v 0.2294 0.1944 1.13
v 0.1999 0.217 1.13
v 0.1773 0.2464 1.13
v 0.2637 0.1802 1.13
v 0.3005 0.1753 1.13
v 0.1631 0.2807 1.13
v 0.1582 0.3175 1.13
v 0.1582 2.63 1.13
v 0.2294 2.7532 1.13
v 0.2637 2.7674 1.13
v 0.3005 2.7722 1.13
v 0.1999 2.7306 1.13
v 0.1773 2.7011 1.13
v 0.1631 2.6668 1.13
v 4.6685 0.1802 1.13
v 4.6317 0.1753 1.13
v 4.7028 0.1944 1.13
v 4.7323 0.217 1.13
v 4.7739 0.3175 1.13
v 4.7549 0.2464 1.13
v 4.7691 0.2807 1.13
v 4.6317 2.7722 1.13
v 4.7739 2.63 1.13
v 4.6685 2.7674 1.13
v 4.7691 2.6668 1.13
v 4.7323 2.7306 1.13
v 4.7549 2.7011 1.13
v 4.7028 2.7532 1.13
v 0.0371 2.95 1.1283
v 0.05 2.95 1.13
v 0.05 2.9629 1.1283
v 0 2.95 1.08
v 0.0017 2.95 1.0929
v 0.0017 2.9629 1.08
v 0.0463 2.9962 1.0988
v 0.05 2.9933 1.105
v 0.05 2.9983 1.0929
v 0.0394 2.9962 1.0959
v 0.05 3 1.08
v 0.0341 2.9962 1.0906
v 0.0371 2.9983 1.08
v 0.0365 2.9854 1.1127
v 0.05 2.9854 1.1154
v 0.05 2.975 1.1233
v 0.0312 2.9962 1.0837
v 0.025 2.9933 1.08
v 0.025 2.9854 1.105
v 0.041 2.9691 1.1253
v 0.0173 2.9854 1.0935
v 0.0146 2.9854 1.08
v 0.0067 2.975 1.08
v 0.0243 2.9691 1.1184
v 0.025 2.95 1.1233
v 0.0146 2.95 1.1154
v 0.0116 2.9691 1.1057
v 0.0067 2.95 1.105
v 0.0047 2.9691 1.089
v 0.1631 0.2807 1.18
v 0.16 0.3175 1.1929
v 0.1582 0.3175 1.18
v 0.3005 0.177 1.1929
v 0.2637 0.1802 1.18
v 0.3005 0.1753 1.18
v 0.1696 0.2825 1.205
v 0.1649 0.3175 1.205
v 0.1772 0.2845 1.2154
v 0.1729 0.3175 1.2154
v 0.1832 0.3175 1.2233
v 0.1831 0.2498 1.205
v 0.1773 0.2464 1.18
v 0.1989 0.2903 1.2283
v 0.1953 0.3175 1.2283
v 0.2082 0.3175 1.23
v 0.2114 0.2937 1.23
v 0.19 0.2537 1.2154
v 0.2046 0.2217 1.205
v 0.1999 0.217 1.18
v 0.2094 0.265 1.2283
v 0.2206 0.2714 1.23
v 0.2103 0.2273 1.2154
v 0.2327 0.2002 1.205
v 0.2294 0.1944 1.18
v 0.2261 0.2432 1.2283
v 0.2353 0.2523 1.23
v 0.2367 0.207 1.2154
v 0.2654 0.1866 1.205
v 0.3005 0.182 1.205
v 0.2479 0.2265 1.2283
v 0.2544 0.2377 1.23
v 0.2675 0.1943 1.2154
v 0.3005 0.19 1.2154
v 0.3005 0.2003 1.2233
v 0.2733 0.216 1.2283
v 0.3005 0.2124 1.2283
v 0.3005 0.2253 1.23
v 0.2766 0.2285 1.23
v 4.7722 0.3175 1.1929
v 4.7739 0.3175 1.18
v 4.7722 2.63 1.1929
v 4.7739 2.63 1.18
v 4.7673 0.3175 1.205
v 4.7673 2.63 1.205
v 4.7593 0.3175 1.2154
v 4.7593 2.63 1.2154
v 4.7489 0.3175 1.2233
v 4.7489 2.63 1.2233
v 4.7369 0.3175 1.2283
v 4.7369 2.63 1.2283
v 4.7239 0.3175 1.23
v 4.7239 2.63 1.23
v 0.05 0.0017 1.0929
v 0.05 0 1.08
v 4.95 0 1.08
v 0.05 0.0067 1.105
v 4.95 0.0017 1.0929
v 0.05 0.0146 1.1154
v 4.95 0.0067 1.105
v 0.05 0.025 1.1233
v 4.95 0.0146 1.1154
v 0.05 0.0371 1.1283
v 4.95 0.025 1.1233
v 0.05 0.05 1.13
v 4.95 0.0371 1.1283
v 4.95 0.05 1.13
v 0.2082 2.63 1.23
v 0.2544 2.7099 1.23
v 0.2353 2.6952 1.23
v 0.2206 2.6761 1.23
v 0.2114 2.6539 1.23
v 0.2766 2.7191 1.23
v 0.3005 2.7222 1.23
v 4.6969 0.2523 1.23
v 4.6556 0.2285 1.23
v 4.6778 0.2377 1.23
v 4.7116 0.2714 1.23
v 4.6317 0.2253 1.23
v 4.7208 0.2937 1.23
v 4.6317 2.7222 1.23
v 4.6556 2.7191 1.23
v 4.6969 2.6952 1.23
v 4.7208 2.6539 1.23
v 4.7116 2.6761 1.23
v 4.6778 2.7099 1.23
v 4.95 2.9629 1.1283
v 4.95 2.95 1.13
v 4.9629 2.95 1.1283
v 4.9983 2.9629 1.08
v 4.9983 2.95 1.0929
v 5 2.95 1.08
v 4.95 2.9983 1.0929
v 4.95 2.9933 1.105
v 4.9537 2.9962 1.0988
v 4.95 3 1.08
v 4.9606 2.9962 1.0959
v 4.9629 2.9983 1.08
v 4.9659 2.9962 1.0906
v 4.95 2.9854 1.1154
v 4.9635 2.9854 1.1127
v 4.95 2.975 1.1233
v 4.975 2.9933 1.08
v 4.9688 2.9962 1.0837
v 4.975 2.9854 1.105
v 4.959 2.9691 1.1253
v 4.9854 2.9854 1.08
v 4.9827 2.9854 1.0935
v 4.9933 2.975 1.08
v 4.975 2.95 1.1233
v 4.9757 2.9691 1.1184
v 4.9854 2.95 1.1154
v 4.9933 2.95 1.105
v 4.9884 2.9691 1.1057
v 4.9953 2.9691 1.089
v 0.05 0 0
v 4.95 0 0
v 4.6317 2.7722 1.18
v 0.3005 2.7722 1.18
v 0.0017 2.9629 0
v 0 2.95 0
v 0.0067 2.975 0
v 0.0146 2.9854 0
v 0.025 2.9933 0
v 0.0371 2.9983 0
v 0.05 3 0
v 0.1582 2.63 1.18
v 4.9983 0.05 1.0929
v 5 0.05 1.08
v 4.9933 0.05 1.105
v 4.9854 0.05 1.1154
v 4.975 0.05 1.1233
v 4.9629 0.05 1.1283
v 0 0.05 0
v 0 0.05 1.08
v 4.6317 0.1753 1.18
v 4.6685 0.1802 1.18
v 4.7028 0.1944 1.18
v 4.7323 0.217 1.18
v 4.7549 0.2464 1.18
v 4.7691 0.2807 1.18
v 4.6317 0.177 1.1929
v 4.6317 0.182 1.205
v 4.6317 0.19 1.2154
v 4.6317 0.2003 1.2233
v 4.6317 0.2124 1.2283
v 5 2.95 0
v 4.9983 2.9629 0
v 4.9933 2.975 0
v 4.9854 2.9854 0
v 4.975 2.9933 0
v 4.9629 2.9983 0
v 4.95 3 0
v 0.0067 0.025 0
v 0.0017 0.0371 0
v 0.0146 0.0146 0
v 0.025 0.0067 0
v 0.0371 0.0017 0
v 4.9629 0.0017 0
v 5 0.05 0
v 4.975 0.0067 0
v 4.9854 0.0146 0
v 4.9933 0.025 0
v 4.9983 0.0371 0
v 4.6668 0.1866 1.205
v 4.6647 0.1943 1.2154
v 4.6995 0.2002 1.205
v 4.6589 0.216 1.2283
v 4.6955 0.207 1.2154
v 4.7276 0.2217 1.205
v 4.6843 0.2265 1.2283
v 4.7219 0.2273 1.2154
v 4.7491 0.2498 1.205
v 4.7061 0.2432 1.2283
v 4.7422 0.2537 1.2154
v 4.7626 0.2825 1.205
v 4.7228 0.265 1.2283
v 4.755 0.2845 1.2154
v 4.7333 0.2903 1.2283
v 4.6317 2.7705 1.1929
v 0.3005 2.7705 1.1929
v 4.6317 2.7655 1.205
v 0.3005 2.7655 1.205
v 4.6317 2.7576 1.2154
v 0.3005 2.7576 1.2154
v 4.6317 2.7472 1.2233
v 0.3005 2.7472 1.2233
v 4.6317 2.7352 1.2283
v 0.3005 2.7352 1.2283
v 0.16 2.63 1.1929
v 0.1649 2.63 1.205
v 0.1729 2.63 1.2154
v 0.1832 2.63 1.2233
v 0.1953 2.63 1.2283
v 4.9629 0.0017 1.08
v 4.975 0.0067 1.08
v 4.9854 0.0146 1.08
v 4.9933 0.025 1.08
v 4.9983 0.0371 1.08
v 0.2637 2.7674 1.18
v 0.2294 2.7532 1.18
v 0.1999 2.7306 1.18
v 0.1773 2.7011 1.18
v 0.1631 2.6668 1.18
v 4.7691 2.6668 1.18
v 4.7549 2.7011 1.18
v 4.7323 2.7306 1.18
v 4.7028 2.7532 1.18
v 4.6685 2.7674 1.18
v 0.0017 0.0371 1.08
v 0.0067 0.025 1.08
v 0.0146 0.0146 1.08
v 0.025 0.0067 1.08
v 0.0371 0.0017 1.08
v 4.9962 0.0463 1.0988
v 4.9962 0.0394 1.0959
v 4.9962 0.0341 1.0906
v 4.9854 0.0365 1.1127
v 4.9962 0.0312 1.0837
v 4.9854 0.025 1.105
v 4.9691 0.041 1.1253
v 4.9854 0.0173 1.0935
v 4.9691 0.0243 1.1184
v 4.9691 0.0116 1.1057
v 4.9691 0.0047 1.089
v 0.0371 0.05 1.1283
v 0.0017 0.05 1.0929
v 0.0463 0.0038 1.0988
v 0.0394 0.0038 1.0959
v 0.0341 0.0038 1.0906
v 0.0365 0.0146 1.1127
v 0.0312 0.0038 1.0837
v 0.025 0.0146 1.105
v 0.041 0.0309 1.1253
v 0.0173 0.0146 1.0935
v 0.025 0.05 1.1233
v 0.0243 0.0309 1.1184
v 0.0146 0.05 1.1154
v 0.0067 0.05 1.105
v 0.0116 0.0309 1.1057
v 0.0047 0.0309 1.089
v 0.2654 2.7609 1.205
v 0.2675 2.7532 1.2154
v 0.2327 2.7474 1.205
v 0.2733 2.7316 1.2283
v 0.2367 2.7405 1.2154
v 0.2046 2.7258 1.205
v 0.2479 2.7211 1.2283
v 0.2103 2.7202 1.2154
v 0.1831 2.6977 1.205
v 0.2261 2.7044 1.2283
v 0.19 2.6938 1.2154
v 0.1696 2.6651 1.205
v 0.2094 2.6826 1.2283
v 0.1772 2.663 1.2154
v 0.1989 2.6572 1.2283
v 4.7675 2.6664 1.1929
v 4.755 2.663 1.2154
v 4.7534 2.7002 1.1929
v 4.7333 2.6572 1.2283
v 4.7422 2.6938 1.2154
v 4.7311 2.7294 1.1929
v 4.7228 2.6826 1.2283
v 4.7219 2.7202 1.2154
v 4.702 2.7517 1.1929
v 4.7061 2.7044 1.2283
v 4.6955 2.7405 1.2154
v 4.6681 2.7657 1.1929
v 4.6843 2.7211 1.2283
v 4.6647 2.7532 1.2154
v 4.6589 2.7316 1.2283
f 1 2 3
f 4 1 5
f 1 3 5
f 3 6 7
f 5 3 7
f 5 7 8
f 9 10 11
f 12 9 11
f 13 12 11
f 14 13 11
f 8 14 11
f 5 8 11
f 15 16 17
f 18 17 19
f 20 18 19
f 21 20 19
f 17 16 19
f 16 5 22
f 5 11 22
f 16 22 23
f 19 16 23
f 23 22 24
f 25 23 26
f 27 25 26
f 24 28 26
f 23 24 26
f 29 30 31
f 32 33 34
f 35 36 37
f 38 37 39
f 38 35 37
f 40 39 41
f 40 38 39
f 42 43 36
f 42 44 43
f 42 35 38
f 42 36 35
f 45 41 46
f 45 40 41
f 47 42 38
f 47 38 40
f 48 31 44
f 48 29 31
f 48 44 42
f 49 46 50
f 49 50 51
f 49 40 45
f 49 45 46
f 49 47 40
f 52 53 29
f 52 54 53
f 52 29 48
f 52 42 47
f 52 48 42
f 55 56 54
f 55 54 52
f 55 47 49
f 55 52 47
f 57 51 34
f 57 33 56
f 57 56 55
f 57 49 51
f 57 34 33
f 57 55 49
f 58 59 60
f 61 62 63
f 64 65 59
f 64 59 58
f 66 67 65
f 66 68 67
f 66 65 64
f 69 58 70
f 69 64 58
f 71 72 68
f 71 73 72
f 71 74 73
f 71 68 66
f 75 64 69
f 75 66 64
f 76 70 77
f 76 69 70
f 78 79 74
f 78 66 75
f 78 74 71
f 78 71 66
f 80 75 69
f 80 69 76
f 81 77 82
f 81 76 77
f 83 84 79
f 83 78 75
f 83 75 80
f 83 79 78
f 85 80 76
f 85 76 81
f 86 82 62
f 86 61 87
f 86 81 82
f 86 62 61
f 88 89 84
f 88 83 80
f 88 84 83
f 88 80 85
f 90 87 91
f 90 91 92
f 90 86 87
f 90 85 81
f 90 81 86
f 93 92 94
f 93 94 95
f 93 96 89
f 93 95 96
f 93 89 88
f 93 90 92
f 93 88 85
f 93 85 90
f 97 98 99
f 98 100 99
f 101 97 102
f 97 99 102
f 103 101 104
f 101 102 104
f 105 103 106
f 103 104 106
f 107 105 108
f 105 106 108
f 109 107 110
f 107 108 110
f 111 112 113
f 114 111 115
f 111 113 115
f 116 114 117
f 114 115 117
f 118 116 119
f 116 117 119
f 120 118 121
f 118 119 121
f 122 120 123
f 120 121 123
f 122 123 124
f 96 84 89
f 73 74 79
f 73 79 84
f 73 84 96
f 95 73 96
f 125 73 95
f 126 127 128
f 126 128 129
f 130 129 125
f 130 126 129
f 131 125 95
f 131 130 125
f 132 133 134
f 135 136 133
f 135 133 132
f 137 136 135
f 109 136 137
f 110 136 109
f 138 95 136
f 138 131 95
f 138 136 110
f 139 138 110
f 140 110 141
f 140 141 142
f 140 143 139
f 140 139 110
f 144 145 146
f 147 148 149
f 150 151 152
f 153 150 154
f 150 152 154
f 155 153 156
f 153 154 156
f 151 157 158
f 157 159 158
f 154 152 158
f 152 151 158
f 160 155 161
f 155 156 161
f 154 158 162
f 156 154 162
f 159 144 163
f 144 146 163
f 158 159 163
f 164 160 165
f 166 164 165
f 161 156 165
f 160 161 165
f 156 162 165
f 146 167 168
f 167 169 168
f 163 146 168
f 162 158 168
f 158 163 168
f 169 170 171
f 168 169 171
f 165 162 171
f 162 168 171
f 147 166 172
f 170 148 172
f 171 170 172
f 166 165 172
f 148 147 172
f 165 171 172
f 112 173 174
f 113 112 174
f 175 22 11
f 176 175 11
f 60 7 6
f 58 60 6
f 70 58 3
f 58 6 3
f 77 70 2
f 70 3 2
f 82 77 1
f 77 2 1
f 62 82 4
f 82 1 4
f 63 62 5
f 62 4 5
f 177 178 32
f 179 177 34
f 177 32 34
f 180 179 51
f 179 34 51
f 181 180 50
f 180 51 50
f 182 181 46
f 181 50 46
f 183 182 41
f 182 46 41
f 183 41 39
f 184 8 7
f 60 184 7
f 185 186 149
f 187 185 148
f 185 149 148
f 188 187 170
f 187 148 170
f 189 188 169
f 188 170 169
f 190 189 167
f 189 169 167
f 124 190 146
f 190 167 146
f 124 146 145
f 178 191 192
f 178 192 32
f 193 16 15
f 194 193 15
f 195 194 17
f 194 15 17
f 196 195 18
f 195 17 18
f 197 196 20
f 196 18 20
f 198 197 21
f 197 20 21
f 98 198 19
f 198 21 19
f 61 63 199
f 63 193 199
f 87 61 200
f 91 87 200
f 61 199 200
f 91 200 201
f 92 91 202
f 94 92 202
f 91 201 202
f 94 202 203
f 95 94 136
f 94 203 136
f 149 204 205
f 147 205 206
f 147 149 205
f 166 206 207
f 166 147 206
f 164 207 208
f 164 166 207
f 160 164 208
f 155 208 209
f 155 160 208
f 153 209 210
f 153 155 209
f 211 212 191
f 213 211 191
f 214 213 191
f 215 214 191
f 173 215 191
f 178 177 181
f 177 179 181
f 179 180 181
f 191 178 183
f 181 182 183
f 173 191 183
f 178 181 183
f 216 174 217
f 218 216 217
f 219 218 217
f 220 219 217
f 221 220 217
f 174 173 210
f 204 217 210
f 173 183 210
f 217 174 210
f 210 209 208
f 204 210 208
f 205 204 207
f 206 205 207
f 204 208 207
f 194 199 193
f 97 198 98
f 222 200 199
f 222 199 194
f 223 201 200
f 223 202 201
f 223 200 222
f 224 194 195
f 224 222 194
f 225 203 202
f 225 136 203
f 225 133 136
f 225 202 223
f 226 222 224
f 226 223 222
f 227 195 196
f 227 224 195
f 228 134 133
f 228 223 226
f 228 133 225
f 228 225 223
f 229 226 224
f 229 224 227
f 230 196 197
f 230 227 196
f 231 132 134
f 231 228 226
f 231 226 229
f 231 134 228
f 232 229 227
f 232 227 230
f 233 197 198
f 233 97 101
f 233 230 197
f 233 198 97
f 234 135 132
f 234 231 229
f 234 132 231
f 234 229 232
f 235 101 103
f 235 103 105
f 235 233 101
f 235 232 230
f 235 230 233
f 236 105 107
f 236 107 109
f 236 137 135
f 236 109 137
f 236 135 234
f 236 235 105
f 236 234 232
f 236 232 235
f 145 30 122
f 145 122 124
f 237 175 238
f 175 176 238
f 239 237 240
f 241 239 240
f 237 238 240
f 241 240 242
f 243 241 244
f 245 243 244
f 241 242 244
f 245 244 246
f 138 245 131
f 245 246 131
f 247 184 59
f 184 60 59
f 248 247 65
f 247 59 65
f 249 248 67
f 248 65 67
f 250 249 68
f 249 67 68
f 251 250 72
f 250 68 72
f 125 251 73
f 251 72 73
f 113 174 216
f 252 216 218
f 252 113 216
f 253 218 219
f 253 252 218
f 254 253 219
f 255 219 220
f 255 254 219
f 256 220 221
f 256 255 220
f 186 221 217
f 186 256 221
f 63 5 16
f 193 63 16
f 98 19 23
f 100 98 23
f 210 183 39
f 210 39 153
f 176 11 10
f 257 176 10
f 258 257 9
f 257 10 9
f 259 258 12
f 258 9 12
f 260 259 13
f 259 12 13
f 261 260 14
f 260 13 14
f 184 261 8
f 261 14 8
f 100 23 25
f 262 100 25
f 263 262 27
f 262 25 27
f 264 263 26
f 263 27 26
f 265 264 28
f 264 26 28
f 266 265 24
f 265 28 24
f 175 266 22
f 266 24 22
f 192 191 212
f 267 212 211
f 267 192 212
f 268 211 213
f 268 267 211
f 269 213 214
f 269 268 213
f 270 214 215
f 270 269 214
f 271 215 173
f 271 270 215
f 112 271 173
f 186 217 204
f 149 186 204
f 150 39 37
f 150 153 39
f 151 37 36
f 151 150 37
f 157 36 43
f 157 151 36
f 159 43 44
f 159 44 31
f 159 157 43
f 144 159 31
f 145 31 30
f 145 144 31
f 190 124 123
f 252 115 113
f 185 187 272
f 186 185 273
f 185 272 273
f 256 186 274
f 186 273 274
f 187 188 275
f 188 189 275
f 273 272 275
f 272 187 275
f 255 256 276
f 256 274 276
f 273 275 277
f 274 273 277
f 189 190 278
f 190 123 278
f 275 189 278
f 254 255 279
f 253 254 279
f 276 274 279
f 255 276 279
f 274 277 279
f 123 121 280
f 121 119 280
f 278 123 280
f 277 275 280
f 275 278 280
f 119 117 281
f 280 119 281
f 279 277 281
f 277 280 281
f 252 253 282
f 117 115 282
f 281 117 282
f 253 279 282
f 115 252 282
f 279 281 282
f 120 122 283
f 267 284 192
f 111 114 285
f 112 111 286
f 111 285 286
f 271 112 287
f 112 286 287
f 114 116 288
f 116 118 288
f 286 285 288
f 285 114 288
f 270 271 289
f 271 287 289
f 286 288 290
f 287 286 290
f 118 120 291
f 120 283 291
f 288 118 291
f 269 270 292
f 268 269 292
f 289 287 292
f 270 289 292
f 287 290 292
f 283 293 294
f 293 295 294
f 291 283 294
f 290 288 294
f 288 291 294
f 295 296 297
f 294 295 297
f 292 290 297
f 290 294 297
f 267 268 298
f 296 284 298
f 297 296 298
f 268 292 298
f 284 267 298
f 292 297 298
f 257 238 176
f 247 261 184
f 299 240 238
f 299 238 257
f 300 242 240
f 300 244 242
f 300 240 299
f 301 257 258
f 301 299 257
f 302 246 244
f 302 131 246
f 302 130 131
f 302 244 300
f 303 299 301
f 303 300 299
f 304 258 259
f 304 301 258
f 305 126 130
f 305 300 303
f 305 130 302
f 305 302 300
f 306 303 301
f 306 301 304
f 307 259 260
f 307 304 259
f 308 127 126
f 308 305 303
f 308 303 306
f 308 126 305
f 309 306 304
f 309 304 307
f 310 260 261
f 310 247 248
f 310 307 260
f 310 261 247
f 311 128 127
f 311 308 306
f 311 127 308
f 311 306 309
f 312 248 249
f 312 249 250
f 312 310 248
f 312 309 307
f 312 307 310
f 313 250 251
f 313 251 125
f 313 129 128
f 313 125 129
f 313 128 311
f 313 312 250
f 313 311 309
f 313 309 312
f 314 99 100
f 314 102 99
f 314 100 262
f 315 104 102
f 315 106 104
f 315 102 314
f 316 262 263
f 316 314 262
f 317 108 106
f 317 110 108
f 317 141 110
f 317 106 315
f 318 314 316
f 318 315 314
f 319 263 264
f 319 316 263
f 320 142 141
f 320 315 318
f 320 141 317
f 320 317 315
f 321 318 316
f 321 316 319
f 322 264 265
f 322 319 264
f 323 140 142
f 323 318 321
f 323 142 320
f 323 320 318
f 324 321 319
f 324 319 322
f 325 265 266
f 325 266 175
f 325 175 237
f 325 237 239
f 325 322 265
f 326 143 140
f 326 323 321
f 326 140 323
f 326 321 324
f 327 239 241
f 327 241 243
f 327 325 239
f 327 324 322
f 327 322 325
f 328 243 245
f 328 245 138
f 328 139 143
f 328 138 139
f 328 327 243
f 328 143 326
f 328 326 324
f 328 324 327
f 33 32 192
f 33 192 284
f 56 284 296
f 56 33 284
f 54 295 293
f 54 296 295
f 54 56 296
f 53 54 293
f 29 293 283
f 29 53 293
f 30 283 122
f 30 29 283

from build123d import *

# Parameters (mm, degrees)
F0_W     = 5
F0_H     = 3
F1_DEPTH = 1.13
F3_DEPTH = 0.1
F4_R     = 0.05
F5_R     = 0.05


with BuildPart() as f1:
    # F0 (on Top) → F1 (new body)
    with BuildSketch(Plane.XY):
        with Locations((2.5, 1.5)):
            Rectangle(F0_W, F0_H)
    extrude(amount=F1_DEPTH)

    # F5
    f5_edges = [f1.edges().sort_by_distance(p)[0] for p in [
        (0, 1.5, 1.13),
        (2.5, 0, 1.13),
        (5, 1.5, 1.13),
        (2.5, 3, 1.13),
        (5, 3, 0.565),
        (5, 0, 0.565),
        (0, 3, 0.565),
        (0, 0, 0.565),
    ]]
    fillet(f5_edges, radius=F5_R)


with BuildPart() as f3:
    # F2 (on face) → F3 (new body)
    with BuildSketch(Plane.XY.offset(1.13)):
        with BuildLine():
            Line((4.631715, 2.772216), (0.30048, 2.772216))
            ThreePointArc((0.30048, 2.772216), (0.199906, 2.730556), (0.158247, 2.629982))
            Line((0.158247, 2.629982), (0.158247, 0.317543))
            ThreePointArc((0.158247, 0.317543), (0.199906, 0.216969), (0.30048, 0.17531))
            Line((0.30048, 0.17531), (4.631715, 0.17531))
            ThreePointArc((4.631715, 0.17531), (4.73229, 0.216969), (4.773949, 0.317543))
            Line((4.773949, 0.317543), (4.773949, 2.629982))
            ThreePointArc((4.773949, 2.629982), (4.73229, 2.730556), (4.631715, 2.772216))
        make_face()
    extrude(amount=F3_DEPTH)

    # F4
    f4_edges = [f3.edges().sort_by_distance(p)[0] for p in [
        (2.466098, 2.772216, 1.23),
        (0.158247, 1.473763, 1.23),
        (2.466098, 0.17531, 1.23),
        (4.773949, 1.473763, 1.23),
        (4.73229, 2.730556, 1.23),
        (4.73229, 0.216969, 1.23),
        (0.199906, 0.216969, 1.23),
        (0.199906, 2.730556, 1.23),
    ]]
    fillet(f4_edges, radius=F4_R)


solid = Compound([f1.part, f3.part])
